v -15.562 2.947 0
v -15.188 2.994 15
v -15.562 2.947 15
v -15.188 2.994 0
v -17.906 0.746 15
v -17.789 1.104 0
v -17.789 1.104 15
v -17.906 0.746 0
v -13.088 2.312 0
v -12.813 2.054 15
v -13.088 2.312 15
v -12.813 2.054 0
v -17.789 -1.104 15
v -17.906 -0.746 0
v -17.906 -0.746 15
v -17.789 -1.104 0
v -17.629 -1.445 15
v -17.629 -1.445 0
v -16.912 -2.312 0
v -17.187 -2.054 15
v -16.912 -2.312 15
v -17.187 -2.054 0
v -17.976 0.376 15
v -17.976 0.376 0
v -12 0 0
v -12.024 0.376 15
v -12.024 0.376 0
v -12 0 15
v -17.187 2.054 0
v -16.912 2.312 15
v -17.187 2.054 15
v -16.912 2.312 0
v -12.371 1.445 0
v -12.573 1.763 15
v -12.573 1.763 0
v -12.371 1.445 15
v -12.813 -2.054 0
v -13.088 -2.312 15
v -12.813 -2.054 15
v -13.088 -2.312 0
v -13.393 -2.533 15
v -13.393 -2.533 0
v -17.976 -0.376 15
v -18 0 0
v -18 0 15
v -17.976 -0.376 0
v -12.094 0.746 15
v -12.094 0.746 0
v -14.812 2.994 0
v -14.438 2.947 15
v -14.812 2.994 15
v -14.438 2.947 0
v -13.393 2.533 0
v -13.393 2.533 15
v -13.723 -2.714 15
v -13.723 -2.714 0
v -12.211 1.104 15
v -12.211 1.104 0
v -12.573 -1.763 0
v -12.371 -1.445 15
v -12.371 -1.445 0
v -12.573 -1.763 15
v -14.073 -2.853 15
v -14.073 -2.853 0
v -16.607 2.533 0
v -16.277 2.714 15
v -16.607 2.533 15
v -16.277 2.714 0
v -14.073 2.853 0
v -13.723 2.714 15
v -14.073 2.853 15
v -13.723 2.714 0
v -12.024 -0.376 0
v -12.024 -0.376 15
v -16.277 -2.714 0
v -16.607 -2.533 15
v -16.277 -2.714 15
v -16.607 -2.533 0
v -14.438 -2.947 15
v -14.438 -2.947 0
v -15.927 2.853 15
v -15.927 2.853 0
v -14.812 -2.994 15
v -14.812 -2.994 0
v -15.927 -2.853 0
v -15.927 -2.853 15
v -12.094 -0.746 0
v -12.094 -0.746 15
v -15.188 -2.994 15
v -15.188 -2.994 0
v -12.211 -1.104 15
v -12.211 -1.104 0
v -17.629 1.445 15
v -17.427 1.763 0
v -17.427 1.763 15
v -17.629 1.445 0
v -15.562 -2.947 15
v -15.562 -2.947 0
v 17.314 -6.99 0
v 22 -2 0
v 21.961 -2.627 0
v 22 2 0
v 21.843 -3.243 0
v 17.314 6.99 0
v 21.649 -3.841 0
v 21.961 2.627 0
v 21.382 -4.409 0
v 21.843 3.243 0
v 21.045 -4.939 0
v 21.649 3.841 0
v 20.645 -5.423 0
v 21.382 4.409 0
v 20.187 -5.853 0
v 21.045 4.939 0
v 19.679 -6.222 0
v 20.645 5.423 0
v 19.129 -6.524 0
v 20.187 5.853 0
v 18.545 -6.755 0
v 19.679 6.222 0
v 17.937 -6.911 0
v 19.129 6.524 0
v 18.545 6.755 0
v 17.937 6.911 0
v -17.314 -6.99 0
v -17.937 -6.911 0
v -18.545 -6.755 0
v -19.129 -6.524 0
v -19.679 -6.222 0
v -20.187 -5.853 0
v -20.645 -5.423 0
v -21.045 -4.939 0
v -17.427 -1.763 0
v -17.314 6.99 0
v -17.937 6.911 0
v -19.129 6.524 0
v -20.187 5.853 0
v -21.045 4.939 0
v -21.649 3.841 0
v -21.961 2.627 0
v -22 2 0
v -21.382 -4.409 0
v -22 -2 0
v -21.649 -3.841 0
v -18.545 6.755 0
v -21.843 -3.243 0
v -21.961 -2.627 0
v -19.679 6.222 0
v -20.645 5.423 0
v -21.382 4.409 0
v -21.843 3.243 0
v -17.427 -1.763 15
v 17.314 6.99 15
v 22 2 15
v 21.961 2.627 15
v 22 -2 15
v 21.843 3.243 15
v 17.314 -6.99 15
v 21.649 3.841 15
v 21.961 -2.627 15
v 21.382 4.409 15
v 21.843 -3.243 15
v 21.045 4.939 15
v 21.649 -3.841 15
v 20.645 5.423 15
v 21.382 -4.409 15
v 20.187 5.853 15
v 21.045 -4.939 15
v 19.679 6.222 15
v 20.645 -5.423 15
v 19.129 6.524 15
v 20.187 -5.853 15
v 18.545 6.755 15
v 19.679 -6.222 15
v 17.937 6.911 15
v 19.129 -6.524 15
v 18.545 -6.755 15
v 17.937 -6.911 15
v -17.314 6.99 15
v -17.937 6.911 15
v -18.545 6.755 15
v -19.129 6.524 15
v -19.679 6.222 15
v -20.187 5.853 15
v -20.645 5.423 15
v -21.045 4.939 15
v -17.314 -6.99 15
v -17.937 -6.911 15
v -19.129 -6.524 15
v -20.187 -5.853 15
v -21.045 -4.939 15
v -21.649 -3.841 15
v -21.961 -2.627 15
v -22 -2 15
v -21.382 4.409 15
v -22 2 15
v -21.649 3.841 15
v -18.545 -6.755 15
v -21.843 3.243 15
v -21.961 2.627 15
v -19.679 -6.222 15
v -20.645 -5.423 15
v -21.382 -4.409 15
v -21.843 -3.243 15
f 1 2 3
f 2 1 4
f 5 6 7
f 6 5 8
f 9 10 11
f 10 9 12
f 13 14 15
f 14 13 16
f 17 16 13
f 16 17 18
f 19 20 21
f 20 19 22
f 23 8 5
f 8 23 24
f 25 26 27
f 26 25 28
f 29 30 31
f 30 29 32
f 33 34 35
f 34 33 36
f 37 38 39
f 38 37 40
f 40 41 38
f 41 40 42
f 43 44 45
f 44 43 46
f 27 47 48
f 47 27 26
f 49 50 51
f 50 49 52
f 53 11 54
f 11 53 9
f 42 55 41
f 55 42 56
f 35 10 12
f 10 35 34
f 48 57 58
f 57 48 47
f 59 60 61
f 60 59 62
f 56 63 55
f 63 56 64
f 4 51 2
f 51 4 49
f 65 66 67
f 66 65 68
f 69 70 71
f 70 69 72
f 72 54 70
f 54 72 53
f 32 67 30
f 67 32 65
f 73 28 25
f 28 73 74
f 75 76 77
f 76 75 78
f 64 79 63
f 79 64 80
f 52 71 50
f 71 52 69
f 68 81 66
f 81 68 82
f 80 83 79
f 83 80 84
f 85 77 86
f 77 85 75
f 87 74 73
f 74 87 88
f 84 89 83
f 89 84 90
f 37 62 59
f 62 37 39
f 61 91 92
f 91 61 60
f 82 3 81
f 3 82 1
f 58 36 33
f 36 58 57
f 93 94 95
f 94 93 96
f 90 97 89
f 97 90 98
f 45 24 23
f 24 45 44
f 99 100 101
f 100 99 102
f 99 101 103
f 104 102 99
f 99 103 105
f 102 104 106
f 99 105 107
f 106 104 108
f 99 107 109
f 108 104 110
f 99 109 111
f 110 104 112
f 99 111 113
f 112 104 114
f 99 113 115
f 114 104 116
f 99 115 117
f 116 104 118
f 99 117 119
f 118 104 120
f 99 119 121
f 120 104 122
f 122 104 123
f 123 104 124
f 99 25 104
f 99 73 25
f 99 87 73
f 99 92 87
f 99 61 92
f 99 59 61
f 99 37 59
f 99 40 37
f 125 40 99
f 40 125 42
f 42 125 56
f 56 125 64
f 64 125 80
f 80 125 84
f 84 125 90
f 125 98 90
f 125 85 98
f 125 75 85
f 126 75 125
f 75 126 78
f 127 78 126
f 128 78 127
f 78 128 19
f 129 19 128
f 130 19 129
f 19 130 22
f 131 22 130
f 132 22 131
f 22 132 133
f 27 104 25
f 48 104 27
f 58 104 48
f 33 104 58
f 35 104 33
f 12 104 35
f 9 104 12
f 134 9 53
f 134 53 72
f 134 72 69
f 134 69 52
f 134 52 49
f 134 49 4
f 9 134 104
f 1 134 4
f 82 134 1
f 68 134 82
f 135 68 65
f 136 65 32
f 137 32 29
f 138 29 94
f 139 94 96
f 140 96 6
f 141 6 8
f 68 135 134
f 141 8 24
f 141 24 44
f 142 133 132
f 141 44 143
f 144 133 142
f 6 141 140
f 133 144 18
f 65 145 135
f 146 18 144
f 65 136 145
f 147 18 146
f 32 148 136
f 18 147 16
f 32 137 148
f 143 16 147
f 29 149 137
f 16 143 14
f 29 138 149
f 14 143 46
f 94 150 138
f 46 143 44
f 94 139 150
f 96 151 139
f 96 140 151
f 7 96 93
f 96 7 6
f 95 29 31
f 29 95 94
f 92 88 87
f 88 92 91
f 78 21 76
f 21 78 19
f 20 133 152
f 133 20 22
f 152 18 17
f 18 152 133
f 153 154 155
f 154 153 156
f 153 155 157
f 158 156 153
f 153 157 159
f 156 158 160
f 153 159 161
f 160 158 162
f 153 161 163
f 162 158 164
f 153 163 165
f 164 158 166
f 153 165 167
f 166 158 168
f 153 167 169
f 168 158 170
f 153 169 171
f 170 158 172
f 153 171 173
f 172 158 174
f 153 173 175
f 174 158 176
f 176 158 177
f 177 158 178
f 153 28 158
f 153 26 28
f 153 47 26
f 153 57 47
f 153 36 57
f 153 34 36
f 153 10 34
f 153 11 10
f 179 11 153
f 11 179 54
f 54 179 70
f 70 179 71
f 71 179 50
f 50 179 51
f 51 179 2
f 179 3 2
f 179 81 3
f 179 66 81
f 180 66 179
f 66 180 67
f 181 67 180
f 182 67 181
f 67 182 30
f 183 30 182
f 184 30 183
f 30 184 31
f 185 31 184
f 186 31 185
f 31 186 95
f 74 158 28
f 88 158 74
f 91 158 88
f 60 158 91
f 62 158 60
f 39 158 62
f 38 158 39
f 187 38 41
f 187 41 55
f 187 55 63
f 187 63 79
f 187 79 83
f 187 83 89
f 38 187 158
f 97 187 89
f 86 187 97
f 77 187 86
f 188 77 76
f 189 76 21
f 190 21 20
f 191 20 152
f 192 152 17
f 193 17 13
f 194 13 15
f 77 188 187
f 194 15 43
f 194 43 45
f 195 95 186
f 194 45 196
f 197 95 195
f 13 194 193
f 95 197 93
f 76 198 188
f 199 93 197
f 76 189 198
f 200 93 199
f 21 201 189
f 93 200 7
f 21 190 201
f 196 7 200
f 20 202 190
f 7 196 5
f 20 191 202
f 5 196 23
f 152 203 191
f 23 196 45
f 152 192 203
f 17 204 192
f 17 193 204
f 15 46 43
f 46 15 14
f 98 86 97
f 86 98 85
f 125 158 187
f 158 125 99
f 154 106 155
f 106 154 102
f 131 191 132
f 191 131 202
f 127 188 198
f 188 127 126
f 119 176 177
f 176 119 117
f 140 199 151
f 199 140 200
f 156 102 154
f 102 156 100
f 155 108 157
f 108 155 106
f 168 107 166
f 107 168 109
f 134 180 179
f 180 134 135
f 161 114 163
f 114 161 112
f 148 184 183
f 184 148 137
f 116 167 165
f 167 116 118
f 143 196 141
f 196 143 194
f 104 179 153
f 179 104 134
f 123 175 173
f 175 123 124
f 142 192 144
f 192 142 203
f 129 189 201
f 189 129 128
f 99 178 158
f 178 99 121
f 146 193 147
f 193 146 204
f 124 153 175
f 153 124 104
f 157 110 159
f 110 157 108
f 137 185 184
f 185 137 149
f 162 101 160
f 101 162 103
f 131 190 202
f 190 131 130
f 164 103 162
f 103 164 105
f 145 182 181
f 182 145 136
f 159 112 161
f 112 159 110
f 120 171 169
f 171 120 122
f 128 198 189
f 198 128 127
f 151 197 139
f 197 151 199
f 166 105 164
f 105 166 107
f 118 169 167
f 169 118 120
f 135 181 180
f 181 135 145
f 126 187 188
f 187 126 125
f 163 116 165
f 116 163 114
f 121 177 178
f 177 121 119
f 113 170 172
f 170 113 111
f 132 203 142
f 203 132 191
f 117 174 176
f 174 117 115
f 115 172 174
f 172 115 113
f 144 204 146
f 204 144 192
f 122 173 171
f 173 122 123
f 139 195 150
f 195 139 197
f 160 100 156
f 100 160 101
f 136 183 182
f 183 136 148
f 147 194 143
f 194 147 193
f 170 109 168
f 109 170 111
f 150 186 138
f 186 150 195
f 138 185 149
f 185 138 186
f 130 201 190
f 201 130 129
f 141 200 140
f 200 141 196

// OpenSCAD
$fn = 50;


difference() {
	union() {
		hull() {
			translate(v = [-17.0000000000, 2.0000000000, 0]) {
				cylinder(h = 15, r = 5);
			}
			translate(v = [17.0000000000, 2.0000000000, 0]) {
				cylinder(h = 15, r = 5);
			}
			translate(v = [-17.0000000000, -2.0000000000, 0]) {
				cylinder(h = 15, r = 5);
			}
			translate(v = [17.0000000000, -2.0000000000, 0]) {
				cylinder(h = 15, r = 5);
			}
		}
	}
	union() {
		translate(v = [-15.0000000000, 0.0000000000, 0]) {
			cylinder(h = 15, r = 3.0000000000);
		}
		translate(v = [-15.0000000000, 0.0000000000, 0]) {
			cylinder(h = 15, r = 1.5000000000);
		}
		translate(v = [-15.0000000000, 0.0000000000, 0]) {
			cylinder(h = 15, r = 1.5000000000);
		}
		translate(v = [-15.0000000000, 0.0000000000, 0]) {
			cylinder(h = 15, r = 1.5000000000);
		}
	}
}
